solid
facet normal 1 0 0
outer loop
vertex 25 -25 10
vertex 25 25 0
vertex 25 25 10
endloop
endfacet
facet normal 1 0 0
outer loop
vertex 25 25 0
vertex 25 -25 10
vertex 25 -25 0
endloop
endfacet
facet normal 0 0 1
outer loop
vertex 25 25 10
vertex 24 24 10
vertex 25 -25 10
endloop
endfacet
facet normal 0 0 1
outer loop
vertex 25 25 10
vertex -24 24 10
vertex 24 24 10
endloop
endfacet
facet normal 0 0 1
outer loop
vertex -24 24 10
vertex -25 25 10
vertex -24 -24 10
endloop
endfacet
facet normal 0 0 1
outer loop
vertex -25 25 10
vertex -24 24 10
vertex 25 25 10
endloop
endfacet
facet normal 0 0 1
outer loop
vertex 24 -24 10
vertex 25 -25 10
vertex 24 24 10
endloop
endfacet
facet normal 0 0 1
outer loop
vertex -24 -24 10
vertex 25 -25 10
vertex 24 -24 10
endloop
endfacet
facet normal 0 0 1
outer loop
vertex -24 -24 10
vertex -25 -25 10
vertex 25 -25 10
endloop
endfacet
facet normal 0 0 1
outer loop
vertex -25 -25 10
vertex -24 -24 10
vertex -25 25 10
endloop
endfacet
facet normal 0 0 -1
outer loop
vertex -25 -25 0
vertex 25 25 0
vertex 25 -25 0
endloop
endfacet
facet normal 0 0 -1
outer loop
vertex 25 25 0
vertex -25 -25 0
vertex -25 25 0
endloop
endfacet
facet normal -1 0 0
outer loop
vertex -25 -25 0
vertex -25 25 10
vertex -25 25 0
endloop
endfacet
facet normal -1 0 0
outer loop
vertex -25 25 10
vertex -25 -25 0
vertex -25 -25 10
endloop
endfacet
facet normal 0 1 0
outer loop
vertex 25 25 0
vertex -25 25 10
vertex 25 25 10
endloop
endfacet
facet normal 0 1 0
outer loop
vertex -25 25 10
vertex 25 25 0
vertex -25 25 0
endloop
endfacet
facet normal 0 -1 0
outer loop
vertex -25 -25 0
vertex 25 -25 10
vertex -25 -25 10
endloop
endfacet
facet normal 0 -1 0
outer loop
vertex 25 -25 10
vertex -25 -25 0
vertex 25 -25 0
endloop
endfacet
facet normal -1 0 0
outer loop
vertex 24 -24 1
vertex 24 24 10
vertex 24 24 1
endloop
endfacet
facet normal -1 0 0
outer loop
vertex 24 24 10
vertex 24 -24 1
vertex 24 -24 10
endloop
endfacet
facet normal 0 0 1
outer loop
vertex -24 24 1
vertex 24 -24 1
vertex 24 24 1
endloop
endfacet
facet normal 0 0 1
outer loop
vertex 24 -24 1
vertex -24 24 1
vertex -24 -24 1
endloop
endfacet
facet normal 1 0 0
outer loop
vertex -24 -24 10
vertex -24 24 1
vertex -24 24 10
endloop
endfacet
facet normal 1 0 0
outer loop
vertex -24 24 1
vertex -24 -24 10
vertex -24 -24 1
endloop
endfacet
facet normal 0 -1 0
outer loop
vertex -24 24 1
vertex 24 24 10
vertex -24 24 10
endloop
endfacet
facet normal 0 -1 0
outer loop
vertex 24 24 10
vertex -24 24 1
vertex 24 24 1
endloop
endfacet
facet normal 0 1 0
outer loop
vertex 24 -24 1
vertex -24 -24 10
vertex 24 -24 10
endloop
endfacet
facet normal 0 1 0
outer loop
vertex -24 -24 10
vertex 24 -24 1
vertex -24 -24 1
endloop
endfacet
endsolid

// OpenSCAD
x = 12 * 4;

difference(){
translate([0,0,5])cube([x+2,x+2,10],center=true);
  translate([0,0,7])cube([x,x,12],center=true);
}
